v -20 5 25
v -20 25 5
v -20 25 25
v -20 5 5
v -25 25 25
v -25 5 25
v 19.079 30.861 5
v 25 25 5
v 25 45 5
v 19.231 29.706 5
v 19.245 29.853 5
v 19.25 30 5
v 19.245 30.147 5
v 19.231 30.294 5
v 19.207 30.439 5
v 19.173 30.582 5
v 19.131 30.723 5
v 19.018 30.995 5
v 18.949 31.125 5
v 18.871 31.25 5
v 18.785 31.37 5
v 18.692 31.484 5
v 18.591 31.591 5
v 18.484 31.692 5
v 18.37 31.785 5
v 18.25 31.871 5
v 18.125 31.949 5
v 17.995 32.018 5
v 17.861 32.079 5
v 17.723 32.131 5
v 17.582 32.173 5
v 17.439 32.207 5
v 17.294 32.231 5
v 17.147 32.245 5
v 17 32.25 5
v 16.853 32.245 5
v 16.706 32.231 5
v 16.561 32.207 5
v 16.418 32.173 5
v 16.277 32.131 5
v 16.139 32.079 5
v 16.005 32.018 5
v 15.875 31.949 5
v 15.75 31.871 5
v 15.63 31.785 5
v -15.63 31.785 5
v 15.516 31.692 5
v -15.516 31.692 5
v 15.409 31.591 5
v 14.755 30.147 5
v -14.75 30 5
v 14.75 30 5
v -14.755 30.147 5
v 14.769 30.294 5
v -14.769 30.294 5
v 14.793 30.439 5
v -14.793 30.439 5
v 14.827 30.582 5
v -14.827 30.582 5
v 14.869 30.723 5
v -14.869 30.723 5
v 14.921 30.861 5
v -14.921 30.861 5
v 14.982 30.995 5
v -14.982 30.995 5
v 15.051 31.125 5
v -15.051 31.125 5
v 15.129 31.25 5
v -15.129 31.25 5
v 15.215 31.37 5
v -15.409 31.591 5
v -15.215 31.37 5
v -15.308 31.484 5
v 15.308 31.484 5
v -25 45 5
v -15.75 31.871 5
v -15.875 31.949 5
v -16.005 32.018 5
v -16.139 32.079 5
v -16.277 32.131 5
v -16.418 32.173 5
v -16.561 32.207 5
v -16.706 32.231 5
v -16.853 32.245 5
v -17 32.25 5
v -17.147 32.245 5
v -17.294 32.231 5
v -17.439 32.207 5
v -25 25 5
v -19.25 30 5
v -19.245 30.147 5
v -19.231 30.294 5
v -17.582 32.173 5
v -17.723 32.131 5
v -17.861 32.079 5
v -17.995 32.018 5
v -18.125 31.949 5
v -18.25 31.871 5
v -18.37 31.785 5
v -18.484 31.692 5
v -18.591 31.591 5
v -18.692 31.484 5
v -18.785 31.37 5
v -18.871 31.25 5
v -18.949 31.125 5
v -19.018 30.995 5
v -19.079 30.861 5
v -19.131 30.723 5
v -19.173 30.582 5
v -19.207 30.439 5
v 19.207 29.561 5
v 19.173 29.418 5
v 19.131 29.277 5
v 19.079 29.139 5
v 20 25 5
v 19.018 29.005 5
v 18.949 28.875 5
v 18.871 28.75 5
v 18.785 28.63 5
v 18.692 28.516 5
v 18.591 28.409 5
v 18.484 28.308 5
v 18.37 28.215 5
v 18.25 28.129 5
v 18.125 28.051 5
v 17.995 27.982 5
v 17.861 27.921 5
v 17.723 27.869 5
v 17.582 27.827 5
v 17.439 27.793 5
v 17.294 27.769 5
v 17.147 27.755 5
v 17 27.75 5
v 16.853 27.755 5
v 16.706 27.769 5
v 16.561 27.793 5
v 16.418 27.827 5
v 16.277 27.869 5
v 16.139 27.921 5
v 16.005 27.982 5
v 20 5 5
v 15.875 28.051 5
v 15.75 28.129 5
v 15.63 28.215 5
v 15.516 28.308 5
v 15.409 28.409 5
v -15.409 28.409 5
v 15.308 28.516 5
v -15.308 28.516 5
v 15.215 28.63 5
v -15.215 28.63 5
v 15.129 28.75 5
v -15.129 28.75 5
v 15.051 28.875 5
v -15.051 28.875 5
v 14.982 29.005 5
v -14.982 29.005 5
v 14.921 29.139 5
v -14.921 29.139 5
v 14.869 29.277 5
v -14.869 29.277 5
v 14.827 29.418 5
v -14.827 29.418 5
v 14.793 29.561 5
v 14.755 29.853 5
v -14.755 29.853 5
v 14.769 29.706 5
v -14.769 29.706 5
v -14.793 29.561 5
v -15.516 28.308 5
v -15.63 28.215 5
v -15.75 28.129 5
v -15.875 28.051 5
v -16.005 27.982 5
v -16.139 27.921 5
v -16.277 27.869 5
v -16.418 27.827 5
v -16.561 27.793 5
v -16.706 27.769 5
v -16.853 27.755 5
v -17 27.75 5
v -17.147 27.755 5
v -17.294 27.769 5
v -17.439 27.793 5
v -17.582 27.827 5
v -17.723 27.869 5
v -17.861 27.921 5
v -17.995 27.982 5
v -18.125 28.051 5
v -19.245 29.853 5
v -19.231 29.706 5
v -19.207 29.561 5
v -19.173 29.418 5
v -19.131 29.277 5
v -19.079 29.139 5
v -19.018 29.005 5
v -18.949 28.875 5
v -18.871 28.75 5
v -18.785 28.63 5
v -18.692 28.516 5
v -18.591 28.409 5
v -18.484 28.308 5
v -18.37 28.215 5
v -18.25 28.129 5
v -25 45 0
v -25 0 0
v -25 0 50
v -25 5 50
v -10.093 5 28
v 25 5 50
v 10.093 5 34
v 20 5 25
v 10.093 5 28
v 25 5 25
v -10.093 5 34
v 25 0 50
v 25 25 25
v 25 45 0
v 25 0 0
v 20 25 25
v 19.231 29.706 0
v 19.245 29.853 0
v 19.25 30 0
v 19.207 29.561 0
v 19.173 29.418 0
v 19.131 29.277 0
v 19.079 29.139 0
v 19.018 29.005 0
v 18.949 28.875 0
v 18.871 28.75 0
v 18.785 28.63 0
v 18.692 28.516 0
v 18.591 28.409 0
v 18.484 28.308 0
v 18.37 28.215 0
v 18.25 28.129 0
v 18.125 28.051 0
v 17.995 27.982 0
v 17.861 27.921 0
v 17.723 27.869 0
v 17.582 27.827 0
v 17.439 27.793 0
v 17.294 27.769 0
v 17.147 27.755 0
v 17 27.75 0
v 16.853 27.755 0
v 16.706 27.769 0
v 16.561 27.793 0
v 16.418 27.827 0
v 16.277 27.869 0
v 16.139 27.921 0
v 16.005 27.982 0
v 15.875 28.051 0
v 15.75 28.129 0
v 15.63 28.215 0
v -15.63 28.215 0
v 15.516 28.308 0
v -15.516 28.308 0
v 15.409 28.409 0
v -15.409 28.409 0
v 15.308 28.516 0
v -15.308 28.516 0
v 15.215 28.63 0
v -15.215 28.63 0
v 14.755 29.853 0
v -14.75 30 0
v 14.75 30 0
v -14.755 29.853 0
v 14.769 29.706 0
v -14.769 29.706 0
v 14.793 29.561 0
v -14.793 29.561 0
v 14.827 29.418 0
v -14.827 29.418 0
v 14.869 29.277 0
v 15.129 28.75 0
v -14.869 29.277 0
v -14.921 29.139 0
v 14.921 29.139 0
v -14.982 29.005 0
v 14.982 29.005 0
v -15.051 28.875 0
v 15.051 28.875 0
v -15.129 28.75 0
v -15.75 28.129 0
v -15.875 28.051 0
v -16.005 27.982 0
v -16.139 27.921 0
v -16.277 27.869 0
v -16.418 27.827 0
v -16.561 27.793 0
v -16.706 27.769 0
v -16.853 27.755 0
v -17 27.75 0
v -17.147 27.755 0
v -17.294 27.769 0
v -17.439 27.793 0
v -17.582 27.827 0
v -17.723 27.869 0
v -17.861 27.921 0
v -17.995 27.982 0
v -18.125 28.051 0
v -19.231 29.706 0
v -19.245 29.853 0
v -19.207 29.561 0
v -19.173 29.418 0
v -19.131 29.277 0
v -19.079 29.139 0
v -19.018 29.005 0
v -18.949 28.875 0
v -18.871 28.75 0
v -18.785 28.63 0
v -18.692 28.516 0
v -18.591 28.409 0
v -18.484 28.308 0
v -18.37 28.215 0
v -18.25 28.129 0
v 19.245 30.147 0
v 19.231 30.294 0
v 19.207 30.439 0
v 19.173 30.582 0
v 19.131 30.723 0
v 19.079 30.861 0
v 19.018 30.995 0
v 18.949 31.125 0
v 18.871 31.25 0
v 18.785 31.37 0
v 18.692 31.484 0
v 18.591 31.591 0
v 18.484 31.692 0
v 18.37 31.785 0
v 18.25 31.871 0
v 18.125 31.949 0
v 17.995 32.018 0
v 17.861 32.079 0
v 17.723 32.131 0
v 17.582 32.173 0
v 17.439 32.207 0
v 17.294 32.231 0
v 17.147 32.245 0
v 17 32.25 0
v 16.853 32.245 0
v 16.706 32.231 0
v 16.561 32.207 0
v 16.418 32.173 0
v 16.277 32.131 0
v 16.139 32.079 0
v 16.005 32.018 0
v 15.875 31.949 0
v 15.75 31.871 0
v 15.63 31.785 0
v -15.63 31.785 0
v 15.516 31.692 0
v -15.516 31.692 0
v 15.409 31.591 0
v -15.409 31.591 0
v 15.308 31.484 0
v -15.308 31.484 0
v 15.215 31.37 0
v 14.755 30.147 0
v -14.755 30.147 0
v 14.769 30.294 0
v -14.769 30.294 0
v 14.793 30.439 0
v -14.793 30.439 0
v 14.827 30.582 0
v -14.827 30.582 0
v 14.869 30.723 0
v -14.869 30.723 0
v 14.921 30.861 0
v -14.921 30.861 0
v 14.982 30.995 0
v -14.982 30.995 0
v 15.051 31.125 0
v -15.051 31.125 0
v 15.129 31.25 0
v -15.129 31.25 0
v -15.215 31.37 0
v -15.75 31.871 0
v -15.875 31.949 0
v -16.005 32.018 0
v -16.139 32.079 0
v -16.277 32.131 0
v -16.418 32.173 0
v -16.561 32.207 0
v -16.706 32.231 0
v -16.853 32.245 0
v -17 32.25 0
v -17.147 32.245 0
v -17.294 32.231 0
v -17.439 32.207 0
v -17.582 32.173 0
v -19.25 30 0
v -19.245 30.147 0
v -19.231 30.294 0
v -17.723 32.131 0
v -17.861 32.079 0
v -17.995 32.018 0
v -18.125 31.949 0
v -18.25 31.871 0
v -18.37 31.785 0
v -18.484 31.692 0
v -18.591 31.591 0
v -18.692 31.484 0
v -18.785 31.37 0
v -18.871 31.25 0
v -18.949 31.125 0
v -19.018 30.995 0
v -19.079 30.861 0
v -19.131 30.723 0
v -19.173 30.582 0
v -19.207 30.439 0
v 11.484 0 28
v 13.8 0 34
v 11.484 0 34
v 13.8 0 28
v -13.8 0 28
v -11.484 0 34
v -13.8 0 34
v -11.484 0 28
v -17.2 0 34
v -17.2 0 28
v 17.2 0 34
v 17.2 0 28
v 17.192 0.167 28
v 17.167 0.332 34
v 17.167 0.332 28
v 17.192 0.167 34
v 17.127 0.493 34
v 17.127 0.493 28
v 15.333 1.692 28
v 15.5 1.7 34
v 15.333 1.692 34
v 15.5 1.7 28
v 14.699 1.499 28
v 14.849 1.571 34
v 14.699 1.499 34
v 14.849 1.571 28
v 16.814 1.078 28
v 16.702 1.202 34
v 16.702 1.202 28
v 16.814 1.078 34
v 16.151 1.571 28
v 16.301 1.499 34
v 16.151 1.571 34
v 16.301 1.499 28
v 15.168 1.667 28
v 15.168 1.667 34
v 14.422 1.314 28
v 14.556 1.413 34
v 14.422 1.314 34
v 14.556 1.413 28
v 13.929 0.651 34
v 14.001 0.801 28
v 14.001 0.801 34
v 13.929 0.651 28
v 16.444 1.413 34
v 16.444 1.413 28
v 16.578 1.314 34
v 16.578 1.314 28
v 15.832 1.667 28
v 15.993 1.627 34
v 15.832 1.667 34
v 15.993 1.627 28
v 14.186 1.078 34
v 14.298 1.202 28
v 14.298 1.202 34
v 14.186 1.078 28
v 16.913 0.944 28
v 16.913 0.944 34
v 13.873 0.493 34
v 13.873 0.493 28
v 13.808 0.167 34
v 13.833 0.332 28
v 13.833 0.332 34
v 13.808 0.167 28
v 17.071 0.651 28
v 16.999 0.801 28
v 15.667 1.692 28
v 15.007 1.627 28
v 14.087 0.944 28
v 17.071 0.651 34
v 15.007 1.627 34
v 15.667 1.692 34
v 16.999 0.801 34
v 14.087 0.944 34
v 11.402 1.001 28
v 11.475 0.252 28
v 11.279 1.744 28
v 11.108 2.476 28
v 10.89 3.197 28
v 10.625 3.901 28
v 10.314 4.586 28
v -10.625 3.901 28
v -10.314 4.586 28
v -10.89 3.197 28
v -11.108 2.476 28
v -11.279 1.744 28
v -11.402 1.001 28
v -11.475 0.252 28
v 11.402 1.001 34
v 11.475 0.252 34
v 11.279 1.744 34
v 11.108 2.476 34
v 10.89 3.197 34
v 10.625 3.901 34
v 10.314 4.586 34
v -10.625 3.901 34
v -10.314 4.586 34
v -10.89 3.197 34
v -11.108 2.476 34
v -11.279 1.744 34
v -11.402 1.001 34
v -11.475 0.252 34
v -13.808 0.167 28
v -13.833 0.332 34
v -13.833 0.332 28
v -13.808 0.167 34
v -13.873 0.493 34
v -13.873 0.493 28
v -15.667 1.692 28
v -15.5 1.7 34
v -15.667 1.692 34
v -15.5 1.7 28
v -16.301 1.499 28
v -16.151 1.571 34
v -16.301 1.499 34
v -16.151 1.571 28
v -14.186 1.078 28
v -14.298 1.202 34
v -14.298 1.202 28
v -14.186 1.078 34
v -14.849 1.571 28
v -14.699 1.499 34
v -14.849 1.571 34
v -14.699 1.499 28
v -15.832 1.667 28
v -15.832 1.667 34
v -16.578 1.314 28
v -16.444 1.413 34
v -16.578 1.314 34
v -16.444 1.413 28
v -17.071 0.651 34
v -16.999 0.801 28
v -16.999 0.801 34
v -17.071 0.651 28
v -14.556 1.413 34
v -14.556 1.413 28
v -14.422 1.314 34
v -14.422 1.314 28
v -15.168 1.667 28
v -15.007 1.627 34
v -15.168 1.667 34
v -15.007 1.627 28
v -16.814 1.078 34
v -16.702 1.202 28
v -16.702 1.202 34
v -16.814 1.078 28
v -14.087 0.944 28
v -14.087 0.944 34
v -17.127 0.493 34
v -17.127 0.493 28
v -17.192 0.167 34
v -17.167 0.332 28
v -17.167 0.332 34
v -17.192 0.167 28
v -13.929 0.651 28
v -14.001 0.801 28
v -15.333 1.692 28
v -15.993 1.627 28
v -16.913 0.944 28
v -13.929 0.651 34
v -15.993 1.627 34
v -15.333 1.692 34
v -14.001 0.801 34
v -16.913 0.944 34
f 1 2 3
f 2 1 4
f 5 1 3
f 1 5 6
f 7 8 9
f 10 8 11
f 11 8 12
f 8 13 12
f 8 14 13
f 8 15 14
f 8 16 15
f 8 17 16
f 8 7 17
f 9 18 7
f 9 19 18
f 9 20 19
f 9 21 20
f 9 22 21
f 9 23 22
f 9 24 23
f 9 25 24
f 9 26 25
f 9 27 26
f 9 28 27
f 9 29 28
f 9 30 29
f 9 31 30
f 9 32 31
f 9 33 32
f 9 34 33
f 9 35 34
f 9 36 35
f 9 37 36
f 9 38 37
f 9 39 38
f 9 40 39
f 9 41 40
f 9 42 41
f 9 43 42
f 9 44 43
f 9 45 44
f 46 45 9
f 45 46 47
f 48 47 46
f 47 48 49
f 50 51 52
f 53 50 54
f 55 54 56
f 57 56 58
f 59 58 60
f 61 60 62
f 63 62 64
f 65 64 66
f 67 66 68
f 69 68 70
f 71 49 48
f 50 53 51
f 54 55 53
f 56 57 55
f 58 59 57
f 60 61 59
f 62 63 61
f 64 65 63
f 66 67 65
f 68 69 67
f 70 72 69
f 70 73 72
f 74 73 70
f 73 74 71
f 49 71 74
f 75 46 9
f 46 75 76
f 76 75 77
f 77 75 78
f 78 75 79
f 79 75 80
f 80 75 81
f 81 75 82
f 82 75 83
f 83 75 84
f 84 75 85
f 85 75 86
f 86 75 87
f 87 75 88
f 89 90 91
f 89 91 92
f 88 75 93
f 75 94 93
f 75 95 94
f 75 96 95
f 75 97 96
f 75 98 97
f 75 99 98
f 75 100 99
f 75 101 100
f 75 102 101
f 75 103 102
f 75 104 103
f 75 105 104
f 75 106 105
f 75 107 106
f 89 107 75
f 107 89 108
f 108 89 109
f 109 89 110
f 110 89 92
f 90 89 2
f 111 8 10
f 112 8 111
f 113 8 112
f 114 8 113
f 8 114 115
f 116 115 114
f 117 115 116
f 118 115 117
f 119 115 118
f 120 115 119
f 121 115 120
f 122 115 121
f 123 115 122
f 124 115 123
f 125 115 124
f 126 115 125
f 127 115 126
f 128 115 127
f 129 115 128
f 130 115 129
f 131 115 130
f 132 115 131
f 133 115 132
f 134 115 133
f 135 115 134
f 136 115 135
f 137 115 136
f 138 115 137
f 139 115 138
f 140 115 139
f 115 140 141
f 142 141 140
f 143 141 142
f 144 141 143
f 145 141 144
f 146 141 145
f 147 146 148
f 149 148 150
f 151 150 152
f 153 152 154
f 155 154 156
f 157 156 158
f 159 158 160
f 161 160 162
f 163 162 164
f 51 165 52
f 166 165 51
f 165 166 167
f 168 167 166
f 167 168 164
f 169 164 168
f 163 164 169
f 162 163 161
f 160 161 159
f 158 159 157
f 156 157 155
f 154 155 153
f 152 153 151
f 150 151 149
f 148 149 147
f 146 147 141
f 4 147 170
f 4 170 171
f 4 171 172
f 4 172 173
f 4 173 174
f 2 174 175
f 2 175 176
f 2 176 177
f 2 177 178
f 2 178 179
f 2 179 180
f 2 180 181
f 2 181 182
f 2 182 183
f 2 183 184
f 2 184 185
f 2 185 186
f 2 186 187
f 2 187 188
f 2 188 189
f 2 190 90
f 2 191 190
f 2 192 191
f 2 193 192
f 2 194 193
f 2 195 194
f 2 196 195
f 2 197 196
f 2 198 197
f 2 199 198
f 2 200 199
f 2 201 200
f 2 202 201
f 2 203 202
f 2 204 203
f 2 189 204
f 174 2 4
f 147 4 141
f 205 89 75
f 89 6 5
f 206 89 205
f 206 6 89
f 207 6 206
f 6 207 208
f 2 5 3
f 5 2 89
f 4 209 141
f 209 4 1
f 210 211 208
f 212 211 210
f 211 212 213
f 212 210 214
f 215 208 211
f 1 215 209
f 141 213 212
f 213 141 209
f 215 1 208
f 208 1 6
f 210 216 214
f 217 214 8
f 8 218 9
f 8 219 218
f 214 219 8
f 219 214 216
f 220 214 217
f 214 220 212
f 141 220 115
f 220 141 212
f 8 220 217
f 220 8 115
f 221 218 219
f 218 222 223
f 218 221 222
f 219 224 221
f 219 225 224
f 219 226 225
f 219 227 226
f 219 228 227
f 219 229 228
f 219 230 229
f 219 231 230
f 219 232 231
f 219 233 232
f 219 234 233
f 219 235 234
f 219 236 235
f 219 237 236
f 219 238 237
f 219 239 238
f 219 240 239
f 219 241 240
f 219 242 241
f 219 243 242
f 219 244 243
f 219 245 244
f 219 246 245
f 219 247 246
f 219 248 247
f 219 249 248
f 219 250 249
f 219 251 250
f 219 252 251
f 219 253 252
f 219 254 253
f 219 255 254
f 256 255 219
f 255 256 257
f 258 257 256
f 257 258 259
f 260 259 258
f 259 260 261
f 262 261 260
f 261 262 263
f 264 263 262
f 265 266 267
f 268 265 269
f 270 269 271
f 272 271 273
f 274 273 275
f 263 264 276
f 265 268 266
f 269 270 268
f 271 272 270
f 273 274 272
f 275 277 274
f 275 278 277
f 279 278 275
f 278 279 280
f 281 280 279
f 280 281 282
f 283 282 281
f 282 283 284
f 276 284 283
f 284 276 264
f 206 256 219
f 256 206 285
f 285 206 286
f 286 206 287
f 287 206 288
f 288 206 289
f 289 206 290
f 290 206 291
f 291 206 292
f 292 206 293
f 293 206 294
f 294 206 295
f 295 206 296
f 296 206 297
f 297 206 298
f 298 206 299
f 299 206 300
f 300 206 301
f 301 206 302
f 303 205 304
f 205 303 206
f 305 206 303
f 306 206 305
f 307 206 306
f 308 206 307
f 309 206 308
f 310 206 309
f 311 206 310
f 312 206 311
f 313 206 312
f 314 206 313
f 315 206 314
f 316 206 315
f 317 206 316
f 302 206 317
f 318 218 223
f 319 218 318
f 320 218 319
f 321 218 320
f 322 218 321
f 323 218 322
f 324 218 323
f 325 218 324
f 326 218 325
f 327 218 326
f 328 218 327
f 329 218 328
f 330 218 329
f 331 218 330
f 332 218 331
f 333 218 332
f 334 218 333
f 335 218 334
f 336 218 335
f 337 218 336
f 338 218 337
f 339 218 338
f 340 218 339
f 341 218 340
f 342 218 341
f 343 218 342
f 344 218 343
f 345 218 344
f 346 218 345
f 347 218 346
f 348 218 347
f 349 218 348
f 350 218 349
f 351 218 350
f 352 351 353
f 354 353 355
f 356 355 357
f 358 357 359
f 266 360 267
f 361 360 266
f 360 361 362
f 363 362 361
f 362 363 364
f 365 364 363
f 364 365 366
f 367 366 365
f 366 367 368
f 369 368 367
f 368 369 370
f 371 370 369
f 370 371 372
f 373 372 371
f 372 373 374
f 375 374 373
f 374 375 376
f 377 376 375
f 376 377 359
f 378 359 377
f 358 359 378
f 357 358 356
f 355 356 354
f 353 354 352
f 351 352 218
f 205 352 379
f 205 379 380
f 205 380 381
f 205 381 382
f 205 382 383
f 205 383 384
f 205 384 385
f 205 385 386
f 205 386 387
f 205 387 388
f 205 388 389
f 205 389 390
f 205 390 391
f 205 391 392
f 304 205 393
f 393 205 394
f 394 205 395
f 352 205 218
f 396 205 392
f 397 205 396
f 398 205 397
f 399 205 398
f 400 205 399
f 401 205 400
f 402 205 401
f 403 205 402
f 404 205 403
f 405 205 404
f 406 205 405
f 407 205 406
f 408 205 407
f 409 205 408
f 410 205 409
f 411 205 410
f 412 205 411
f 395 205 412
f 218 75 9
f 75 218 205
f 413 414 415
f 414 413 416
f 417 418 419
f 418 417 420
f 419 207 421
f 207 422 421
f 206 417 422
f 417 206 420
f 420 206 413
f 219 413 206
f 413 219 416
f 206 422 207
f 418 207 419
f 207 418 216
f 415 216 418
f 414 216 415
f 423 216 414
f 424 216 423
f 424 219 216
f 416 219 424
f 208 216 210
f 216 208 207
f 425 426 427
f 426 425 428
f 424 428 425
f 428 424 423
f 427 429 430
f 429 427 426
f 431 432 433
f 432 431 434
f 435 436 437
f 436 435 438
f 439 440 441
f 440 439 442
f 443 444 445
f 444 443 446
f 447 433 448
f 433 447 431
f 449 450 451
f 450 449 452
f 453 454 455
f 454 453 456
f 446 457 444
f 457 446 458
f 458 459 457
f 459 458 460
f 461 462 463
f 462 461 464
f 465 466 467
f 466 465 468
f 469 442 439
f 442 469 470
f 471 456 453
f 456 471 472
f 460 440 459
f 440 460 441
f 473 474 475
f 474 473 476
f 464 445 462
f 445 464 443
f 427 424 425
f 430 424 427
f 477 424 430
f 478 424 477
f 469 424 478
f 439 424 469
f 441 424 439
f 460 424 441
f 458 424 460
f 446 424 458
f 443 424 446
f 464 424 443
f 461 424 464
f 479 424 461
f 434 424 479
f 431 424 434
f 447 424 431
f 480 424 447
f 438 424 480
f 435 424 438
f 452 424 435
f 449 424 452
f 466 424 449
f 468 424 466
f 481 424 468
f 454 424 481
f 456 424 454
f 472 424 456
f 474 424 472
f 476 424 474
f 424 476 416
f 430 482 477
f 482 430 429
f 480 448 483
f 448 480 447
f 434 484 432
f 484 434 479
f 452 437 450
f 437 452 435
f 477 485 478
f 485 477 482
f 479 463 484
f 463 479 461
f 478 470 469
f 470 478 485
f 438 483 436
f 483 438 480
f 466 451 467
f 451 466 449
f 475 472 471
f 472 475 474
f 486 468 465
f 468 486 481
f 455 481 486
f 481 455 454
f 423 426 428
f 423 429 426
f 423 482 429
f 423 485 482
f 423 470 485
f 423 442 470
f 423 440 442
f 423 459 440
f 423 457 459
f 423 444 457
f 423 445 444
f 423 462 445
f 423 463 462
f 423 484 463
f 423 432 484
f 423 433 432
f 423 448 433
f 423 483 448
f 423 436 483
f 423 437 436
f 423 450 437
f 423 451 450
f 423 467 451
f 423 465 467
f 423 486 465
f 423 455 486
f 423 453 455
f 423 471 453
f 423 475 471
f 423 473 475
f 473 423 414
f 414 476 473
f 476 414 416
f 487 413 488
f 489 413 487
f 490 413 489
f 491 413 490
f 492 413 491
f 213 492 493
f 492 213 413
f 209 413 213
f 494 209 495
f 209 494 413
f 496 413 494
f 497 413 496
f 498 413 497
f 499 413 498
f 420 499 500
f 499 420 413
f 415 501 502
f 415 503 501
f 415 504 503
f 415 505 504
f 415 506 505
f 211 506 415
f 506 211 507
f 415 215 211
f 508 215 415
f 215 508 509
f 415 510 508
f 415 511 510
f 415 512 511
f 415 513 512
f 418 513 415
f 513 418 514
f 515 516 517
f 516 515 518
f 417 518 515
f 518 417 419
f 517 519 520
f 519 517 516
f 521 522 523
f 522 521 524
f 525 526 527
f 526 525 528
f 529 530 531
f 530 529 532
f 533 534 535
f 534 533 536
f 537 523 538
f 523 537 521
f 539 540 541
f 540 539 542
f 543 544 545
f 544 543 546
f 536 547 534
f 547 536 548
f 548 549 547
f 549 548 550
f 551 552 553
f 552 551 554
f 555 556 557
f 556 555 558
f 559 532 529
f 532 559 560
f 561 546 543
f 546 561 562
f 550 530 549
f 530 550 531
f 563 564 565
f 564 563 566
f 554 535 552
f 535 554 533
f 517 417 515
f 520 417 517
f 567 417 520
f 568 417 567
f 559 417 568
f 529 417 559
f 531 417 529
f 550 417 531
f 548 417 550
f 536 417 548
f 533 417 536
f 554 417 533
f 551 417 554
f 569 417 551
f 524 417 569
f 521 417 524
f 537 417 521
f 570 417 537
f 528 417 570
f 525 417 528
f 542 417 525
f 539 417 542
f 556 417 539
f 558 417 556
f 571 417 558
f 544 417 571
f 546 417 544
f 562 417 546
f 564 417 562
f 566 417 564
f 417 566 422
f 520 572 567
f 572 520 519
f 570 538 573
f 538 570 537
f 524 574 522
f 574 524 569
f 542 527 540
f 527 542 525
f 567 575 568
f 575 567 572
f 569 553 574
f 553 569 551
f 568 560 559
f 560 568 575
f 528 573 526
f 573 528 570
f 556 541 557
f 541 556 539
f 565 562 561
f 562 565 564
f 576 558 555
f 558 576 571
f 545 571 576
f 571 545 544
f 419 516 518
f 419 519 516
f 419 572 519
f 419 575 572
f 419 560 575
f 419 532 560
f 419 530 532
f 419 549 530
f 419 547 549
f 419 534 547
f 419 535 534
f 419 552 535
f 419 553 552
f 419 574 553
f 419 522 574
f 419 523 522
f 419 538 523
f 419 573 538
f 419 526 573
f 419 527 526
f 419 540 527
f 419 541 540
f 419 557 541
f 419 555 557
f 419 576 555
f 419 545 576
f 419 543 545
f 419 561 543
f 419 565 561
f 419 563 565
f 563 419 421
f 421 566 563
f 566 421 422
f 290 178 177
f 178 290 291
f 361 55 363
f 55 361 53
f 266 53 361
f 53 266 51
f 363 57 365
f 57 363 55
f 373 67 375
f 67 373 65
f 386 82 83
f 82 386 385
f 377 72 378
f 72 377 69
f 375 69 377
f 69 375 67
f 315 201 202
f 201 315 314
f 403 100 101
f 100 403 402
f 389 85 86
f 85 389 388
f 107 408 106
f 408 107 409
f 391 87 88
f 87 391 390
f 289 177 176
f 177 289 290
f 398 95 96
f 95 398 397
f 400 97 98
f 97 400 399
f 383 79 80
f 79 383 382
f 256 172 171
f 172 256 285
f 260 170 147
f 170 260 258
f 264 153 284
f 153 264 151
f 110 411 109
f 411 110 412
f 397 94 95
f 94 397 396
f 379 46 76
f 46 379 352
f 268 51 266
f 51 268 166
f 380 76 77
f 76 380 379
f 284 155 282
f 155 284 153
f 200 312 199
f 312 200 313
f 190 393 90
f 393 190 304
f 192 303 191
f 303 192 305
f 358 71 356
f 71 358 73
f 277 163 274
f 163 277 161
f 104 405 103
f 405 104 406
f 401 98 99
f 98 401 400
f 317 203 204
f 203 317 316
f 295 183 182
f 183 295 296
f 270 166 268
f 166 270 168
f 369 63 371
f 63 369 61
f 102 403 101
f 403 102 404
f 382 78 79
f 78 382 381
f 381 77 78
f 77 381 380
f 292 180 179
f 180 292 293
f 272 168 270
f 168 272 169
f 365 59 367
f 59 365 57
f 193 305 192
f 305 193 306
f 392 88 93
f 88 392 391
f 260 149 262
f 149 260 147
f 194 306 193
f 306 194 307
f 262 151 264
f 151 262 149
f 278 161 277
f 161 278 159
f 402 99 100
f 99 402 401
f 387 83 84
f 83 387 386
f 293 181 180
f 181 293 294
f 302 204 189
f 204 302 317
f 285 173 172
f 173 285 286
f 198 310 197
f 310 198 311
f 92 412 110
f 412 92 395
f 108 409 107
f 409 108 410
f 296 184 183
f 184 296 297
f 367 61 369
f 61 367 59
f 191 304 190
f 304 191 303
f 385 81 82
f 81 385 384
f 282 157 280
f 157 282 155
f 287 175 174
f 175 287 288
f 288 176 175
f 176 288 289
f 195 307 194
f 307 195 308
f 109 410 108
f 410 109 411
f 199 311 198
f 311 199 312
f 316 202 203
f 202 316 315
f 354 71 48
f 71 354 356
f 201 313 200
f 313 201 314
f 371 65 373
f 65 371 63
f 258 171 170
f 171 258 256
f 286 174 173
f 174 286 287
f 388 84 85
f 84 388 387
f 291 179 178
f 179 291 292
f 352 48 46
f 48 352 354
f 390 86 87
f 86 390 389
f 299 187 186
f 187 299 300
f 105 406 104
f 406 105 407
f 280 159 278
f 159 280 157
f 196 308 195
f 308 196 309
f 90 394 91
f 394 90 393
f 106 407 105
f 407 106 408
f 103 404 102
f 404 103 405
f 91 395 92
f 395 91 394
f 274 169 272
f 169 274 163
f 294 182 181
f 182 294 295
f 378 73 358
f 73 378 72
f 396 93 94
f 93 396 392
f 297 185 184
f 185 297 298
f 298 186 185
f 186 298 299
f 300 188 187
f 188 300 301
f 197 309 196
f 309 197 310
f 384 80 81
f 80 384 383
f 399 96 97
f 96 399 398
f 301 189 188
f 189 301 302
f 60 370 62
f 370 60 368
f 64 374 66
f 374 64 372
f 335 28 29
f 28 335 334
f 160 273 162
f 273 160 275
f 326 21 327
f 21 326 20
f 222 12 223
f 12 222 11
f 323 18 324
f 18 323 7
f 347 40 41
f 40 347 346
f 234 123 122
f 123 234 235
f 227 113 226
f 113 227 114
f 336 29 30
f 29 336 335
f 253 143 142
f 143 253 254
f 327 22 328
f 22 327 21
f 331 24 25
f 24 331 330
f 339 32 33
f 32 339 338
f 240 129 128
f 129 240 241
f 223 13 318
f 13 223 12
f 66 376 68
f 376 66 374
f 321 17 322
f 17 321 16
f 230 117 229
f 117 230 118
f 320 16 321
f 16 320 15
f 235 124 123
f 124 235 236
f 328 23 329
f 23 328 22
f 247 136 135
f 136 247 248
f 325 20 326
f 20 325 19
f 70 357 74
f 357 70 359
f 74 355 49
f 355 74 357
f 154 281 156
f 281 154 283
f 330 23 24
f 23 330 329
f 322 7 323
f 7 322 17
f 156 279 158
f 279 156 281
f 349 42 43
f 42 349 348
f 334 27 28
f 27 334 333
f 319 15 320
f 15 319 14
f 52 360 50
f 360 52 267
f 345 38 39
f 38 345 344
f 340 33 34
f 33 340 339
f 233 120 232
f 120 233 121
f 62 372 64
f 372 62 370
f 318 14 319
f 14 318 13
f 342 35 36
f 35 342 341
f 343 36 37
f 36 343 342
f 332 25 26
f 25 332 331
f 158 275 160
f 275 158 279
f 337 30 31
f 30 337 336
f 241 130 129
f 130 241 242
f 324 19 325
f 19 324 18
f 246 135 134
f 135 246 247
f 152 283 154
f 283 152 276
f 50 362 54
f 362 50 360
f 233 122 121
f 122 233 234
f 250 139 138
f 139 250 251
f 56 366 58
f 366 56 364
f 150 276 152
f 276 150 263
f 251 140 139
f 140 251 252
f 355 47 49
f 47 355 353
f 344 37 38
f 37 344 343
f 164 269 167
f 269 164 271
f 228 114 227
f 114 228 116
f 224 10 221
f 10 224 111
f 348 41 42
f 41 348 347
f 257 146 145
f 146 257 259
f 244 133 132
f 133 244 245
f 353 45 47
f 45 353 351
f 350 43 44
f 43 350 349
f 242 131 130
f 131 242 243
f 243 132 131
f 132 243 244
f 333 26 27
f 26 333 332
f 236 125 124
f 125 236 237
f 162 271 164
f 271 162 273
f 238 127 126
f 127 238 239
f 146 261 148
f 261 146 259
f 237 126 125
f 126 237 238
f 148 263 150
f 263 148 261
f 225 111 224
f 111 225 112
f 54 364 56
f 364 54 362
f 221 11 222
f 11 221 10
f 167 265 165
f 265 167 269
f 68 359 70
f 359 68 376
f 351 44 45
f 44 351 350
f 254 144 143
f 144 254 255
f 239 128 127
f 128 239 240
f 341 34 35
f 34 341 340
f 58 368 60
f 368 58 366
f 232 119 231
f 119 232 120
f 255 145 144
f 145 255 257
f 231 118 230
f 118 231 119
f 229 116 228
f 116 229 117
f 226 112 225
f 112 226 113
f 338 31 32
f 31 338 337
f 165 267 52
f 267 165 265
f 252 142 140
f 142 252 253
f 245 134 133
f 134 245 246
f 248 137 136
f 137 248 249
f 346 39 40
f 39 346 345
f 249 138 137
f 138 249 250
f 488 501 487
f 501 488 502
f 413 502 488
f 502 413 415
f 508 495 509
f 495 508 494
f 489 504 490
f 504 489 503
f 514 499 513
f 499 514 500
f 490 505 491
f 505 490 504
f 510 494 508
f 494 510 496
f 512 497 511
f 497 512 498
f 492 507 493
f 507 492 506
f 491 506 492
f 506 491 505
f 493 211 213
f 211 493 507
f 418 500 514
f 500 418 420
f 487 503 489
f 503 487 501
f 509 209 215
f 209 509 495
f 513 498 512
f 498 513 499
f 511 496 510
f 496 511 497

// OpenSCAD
// L-shaped mounting bracket for NEMA 17 stepper motor (e.g. syringe pump)
// Print orientation: base plate on bed, vertical plate builds upward (+Z)

// ---------------- Parameters ----------------
base_x      = 25;     // base plate half-length in X (plate spans -25 to 25)
base_y      = 45;     // base plate length in Y (0 to 45)
base_z      = 5;      // base plate thickness

motor_h     = 50;     // vertical motor plate height (z = 0 to 50)
motor_t     = 5;      // vertical motor plate thickness in Y (0 to 5)

boss_d      = 23;     // motor centring boss hole diameter
boss_x      = 0;      // boss hole X position
boss_z      = 28;     // boss hole Z position

screw_d     = 3.4;    // M3 screw hole diameter
screw_n     = 4;      // number of screw holes
screw_a     = 31;     // screw hole square pattern size (centre to centre)

gusset_t    = 5;      // gusset thickness in X
gusset_y    = 20;     // gusset leg along +Y (from y = 5)
gusset_z    = 20;     // gusset leg along +Z (from z = 5)

eps         = 0.5;    // cutter overshoot past faces
$fn         = 96;     // curve resolution

// ---------------- Model ----------------
difference() {
    union() {
        // Base plate
        translate([-base_x, 0, 0])
            cube([2 * base_x, base_y, base_z]);

        // Vertical motor plate
        translate([-base_x, 0, 0])
            cube([2 * base_x, motor_t, motor_h]);

        // Gussets: right-angle corner at (y = 5, z = 5), flush with edges
        for (sx = [-1, 1])
            translate([sx > 0 ? base_x - gusset_t : -base_x, 5, 5])
                cube([gusset_t, gusset_y, gusset_z]);
    }

    // Base plate M4 through-holes
    translate([-17, 30, -eps])
        cylinder(d = 4.5, h = base_z + 2 * eps);
    translate([17, 30, -eps])
        cylinder(d = 4.5, h = base_z + 2 * eps);

    // Motor plate boss hole (along Y) and M3 screw pattern
    translate([boss_x, -eps, boss_z])
        cylinder(d = boss_d, h = motor_t + 2 * eps);
    for (i = [0 : screw_n - 1]) {
        a = screw_a / 2 * [1, 0, -1, 0][i];   // square pattern, centred
        translate([a, 0, boss_z])
            cylinder(d = screw_d, h = motor_t + 2 * eps, $fn = 64);
    }
}
